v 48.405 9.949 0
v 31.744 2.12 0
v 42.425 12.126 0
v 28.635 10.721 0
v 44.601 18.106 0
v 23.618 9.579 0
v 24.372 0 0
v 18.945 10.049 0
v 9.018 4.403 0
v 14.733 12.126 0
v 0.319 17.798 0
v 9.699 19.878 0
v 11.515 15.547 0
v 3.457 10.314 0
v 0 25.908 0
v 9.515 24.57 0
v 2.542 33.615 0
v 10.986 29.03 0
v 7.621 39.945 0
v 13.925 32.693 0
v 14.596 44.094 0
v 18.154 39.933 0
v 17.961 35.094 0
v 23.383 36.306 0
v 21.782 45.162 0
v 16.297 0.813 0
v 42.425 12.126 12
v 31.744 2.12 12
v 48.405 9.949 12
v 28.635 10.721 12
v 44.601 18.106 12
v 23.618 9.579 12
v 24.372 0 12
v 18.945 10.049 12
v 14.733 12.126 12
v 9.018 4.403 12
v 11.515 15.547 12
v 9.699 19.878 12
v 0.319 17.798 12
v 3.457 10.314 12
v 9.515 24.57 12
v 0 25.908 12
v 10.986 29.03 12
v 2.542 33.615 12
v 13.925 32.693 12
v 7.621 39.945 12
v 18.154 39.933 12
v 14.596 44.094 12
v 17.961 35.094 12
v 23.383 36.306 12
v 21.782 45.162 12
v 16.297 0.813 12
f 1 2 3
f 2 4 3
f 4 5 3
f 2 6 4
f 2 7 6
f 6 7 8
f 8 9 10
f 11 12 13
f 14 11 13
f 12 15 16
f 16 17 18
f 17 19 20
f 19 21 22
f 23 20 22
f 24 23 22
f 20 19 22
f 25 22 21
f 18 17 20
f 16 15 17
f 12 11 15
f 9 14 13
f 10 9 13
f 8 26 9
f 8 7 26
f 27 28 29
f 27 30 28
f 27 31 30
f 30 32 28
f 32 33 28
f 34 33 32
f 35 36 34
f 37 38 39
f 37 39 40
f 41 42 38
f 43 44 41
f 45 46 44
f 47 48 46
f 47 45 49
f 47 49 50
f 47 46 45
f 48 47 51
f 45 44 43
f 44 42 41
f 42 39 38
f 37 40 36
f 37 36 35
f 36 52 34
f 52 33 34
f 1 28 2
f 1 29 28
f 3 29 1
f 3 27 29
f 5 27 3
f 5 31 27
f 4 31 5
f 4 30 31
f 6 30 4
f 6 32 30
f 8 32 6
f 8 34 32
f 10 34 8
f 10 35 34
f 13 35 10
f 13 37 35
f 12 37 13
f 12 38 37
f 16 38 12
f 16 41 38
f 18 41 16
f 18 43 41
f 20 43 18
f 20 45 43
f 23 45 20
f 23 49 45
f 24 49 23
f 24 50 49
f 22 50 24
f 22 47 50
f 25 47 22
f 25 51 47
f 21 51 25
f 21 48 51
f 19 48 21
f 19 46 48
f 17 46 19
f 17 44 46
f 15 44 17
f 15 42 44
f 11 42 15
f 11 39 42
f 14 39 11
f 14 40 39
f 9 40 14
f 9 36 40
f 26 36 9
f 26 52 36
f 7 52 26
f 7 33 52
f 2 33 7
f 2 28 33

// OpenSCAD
$fn = 32;

// ----------------------------------------------------------------------
// Hook plate: curl radius 18 mm over 205 degrees, 9 mm thick band
// ----------------------------------------------------------------------

// --- parameters (mm) ---
profile_height = 12;      // extrusion height
profile_points = 26;      // points of the closed outline

profile = [[18.154, 39.933], [21.782, 45.162], [14.596, 44.094], [7.621, 39.945], [2.542, 33.615], [0, 25.908], [0.319, 17.798], [3.457, 10.314], [9.018, 4.403], [16.297, 0.813], [24.372, 0], [31.744, 2.12], [48.405, 9.949], [42.425, 12.126], [44.601, 18.106], [28.635, 10.721], [23.618, 9.579], [18.945, 10.049], [14.733, 12.126], [11.515, 15.547], [9.699, 19.878], [9.515, 24.57], [10.986, 29.03], [13.925, 32.693], [17.961, 35.094], [23.383, 36.306]];  // single closed polygon, 26 points, counter clockwise

// --- the one profile operation ---
linear_extrude(height = profile_height) polygon(points = profile);
